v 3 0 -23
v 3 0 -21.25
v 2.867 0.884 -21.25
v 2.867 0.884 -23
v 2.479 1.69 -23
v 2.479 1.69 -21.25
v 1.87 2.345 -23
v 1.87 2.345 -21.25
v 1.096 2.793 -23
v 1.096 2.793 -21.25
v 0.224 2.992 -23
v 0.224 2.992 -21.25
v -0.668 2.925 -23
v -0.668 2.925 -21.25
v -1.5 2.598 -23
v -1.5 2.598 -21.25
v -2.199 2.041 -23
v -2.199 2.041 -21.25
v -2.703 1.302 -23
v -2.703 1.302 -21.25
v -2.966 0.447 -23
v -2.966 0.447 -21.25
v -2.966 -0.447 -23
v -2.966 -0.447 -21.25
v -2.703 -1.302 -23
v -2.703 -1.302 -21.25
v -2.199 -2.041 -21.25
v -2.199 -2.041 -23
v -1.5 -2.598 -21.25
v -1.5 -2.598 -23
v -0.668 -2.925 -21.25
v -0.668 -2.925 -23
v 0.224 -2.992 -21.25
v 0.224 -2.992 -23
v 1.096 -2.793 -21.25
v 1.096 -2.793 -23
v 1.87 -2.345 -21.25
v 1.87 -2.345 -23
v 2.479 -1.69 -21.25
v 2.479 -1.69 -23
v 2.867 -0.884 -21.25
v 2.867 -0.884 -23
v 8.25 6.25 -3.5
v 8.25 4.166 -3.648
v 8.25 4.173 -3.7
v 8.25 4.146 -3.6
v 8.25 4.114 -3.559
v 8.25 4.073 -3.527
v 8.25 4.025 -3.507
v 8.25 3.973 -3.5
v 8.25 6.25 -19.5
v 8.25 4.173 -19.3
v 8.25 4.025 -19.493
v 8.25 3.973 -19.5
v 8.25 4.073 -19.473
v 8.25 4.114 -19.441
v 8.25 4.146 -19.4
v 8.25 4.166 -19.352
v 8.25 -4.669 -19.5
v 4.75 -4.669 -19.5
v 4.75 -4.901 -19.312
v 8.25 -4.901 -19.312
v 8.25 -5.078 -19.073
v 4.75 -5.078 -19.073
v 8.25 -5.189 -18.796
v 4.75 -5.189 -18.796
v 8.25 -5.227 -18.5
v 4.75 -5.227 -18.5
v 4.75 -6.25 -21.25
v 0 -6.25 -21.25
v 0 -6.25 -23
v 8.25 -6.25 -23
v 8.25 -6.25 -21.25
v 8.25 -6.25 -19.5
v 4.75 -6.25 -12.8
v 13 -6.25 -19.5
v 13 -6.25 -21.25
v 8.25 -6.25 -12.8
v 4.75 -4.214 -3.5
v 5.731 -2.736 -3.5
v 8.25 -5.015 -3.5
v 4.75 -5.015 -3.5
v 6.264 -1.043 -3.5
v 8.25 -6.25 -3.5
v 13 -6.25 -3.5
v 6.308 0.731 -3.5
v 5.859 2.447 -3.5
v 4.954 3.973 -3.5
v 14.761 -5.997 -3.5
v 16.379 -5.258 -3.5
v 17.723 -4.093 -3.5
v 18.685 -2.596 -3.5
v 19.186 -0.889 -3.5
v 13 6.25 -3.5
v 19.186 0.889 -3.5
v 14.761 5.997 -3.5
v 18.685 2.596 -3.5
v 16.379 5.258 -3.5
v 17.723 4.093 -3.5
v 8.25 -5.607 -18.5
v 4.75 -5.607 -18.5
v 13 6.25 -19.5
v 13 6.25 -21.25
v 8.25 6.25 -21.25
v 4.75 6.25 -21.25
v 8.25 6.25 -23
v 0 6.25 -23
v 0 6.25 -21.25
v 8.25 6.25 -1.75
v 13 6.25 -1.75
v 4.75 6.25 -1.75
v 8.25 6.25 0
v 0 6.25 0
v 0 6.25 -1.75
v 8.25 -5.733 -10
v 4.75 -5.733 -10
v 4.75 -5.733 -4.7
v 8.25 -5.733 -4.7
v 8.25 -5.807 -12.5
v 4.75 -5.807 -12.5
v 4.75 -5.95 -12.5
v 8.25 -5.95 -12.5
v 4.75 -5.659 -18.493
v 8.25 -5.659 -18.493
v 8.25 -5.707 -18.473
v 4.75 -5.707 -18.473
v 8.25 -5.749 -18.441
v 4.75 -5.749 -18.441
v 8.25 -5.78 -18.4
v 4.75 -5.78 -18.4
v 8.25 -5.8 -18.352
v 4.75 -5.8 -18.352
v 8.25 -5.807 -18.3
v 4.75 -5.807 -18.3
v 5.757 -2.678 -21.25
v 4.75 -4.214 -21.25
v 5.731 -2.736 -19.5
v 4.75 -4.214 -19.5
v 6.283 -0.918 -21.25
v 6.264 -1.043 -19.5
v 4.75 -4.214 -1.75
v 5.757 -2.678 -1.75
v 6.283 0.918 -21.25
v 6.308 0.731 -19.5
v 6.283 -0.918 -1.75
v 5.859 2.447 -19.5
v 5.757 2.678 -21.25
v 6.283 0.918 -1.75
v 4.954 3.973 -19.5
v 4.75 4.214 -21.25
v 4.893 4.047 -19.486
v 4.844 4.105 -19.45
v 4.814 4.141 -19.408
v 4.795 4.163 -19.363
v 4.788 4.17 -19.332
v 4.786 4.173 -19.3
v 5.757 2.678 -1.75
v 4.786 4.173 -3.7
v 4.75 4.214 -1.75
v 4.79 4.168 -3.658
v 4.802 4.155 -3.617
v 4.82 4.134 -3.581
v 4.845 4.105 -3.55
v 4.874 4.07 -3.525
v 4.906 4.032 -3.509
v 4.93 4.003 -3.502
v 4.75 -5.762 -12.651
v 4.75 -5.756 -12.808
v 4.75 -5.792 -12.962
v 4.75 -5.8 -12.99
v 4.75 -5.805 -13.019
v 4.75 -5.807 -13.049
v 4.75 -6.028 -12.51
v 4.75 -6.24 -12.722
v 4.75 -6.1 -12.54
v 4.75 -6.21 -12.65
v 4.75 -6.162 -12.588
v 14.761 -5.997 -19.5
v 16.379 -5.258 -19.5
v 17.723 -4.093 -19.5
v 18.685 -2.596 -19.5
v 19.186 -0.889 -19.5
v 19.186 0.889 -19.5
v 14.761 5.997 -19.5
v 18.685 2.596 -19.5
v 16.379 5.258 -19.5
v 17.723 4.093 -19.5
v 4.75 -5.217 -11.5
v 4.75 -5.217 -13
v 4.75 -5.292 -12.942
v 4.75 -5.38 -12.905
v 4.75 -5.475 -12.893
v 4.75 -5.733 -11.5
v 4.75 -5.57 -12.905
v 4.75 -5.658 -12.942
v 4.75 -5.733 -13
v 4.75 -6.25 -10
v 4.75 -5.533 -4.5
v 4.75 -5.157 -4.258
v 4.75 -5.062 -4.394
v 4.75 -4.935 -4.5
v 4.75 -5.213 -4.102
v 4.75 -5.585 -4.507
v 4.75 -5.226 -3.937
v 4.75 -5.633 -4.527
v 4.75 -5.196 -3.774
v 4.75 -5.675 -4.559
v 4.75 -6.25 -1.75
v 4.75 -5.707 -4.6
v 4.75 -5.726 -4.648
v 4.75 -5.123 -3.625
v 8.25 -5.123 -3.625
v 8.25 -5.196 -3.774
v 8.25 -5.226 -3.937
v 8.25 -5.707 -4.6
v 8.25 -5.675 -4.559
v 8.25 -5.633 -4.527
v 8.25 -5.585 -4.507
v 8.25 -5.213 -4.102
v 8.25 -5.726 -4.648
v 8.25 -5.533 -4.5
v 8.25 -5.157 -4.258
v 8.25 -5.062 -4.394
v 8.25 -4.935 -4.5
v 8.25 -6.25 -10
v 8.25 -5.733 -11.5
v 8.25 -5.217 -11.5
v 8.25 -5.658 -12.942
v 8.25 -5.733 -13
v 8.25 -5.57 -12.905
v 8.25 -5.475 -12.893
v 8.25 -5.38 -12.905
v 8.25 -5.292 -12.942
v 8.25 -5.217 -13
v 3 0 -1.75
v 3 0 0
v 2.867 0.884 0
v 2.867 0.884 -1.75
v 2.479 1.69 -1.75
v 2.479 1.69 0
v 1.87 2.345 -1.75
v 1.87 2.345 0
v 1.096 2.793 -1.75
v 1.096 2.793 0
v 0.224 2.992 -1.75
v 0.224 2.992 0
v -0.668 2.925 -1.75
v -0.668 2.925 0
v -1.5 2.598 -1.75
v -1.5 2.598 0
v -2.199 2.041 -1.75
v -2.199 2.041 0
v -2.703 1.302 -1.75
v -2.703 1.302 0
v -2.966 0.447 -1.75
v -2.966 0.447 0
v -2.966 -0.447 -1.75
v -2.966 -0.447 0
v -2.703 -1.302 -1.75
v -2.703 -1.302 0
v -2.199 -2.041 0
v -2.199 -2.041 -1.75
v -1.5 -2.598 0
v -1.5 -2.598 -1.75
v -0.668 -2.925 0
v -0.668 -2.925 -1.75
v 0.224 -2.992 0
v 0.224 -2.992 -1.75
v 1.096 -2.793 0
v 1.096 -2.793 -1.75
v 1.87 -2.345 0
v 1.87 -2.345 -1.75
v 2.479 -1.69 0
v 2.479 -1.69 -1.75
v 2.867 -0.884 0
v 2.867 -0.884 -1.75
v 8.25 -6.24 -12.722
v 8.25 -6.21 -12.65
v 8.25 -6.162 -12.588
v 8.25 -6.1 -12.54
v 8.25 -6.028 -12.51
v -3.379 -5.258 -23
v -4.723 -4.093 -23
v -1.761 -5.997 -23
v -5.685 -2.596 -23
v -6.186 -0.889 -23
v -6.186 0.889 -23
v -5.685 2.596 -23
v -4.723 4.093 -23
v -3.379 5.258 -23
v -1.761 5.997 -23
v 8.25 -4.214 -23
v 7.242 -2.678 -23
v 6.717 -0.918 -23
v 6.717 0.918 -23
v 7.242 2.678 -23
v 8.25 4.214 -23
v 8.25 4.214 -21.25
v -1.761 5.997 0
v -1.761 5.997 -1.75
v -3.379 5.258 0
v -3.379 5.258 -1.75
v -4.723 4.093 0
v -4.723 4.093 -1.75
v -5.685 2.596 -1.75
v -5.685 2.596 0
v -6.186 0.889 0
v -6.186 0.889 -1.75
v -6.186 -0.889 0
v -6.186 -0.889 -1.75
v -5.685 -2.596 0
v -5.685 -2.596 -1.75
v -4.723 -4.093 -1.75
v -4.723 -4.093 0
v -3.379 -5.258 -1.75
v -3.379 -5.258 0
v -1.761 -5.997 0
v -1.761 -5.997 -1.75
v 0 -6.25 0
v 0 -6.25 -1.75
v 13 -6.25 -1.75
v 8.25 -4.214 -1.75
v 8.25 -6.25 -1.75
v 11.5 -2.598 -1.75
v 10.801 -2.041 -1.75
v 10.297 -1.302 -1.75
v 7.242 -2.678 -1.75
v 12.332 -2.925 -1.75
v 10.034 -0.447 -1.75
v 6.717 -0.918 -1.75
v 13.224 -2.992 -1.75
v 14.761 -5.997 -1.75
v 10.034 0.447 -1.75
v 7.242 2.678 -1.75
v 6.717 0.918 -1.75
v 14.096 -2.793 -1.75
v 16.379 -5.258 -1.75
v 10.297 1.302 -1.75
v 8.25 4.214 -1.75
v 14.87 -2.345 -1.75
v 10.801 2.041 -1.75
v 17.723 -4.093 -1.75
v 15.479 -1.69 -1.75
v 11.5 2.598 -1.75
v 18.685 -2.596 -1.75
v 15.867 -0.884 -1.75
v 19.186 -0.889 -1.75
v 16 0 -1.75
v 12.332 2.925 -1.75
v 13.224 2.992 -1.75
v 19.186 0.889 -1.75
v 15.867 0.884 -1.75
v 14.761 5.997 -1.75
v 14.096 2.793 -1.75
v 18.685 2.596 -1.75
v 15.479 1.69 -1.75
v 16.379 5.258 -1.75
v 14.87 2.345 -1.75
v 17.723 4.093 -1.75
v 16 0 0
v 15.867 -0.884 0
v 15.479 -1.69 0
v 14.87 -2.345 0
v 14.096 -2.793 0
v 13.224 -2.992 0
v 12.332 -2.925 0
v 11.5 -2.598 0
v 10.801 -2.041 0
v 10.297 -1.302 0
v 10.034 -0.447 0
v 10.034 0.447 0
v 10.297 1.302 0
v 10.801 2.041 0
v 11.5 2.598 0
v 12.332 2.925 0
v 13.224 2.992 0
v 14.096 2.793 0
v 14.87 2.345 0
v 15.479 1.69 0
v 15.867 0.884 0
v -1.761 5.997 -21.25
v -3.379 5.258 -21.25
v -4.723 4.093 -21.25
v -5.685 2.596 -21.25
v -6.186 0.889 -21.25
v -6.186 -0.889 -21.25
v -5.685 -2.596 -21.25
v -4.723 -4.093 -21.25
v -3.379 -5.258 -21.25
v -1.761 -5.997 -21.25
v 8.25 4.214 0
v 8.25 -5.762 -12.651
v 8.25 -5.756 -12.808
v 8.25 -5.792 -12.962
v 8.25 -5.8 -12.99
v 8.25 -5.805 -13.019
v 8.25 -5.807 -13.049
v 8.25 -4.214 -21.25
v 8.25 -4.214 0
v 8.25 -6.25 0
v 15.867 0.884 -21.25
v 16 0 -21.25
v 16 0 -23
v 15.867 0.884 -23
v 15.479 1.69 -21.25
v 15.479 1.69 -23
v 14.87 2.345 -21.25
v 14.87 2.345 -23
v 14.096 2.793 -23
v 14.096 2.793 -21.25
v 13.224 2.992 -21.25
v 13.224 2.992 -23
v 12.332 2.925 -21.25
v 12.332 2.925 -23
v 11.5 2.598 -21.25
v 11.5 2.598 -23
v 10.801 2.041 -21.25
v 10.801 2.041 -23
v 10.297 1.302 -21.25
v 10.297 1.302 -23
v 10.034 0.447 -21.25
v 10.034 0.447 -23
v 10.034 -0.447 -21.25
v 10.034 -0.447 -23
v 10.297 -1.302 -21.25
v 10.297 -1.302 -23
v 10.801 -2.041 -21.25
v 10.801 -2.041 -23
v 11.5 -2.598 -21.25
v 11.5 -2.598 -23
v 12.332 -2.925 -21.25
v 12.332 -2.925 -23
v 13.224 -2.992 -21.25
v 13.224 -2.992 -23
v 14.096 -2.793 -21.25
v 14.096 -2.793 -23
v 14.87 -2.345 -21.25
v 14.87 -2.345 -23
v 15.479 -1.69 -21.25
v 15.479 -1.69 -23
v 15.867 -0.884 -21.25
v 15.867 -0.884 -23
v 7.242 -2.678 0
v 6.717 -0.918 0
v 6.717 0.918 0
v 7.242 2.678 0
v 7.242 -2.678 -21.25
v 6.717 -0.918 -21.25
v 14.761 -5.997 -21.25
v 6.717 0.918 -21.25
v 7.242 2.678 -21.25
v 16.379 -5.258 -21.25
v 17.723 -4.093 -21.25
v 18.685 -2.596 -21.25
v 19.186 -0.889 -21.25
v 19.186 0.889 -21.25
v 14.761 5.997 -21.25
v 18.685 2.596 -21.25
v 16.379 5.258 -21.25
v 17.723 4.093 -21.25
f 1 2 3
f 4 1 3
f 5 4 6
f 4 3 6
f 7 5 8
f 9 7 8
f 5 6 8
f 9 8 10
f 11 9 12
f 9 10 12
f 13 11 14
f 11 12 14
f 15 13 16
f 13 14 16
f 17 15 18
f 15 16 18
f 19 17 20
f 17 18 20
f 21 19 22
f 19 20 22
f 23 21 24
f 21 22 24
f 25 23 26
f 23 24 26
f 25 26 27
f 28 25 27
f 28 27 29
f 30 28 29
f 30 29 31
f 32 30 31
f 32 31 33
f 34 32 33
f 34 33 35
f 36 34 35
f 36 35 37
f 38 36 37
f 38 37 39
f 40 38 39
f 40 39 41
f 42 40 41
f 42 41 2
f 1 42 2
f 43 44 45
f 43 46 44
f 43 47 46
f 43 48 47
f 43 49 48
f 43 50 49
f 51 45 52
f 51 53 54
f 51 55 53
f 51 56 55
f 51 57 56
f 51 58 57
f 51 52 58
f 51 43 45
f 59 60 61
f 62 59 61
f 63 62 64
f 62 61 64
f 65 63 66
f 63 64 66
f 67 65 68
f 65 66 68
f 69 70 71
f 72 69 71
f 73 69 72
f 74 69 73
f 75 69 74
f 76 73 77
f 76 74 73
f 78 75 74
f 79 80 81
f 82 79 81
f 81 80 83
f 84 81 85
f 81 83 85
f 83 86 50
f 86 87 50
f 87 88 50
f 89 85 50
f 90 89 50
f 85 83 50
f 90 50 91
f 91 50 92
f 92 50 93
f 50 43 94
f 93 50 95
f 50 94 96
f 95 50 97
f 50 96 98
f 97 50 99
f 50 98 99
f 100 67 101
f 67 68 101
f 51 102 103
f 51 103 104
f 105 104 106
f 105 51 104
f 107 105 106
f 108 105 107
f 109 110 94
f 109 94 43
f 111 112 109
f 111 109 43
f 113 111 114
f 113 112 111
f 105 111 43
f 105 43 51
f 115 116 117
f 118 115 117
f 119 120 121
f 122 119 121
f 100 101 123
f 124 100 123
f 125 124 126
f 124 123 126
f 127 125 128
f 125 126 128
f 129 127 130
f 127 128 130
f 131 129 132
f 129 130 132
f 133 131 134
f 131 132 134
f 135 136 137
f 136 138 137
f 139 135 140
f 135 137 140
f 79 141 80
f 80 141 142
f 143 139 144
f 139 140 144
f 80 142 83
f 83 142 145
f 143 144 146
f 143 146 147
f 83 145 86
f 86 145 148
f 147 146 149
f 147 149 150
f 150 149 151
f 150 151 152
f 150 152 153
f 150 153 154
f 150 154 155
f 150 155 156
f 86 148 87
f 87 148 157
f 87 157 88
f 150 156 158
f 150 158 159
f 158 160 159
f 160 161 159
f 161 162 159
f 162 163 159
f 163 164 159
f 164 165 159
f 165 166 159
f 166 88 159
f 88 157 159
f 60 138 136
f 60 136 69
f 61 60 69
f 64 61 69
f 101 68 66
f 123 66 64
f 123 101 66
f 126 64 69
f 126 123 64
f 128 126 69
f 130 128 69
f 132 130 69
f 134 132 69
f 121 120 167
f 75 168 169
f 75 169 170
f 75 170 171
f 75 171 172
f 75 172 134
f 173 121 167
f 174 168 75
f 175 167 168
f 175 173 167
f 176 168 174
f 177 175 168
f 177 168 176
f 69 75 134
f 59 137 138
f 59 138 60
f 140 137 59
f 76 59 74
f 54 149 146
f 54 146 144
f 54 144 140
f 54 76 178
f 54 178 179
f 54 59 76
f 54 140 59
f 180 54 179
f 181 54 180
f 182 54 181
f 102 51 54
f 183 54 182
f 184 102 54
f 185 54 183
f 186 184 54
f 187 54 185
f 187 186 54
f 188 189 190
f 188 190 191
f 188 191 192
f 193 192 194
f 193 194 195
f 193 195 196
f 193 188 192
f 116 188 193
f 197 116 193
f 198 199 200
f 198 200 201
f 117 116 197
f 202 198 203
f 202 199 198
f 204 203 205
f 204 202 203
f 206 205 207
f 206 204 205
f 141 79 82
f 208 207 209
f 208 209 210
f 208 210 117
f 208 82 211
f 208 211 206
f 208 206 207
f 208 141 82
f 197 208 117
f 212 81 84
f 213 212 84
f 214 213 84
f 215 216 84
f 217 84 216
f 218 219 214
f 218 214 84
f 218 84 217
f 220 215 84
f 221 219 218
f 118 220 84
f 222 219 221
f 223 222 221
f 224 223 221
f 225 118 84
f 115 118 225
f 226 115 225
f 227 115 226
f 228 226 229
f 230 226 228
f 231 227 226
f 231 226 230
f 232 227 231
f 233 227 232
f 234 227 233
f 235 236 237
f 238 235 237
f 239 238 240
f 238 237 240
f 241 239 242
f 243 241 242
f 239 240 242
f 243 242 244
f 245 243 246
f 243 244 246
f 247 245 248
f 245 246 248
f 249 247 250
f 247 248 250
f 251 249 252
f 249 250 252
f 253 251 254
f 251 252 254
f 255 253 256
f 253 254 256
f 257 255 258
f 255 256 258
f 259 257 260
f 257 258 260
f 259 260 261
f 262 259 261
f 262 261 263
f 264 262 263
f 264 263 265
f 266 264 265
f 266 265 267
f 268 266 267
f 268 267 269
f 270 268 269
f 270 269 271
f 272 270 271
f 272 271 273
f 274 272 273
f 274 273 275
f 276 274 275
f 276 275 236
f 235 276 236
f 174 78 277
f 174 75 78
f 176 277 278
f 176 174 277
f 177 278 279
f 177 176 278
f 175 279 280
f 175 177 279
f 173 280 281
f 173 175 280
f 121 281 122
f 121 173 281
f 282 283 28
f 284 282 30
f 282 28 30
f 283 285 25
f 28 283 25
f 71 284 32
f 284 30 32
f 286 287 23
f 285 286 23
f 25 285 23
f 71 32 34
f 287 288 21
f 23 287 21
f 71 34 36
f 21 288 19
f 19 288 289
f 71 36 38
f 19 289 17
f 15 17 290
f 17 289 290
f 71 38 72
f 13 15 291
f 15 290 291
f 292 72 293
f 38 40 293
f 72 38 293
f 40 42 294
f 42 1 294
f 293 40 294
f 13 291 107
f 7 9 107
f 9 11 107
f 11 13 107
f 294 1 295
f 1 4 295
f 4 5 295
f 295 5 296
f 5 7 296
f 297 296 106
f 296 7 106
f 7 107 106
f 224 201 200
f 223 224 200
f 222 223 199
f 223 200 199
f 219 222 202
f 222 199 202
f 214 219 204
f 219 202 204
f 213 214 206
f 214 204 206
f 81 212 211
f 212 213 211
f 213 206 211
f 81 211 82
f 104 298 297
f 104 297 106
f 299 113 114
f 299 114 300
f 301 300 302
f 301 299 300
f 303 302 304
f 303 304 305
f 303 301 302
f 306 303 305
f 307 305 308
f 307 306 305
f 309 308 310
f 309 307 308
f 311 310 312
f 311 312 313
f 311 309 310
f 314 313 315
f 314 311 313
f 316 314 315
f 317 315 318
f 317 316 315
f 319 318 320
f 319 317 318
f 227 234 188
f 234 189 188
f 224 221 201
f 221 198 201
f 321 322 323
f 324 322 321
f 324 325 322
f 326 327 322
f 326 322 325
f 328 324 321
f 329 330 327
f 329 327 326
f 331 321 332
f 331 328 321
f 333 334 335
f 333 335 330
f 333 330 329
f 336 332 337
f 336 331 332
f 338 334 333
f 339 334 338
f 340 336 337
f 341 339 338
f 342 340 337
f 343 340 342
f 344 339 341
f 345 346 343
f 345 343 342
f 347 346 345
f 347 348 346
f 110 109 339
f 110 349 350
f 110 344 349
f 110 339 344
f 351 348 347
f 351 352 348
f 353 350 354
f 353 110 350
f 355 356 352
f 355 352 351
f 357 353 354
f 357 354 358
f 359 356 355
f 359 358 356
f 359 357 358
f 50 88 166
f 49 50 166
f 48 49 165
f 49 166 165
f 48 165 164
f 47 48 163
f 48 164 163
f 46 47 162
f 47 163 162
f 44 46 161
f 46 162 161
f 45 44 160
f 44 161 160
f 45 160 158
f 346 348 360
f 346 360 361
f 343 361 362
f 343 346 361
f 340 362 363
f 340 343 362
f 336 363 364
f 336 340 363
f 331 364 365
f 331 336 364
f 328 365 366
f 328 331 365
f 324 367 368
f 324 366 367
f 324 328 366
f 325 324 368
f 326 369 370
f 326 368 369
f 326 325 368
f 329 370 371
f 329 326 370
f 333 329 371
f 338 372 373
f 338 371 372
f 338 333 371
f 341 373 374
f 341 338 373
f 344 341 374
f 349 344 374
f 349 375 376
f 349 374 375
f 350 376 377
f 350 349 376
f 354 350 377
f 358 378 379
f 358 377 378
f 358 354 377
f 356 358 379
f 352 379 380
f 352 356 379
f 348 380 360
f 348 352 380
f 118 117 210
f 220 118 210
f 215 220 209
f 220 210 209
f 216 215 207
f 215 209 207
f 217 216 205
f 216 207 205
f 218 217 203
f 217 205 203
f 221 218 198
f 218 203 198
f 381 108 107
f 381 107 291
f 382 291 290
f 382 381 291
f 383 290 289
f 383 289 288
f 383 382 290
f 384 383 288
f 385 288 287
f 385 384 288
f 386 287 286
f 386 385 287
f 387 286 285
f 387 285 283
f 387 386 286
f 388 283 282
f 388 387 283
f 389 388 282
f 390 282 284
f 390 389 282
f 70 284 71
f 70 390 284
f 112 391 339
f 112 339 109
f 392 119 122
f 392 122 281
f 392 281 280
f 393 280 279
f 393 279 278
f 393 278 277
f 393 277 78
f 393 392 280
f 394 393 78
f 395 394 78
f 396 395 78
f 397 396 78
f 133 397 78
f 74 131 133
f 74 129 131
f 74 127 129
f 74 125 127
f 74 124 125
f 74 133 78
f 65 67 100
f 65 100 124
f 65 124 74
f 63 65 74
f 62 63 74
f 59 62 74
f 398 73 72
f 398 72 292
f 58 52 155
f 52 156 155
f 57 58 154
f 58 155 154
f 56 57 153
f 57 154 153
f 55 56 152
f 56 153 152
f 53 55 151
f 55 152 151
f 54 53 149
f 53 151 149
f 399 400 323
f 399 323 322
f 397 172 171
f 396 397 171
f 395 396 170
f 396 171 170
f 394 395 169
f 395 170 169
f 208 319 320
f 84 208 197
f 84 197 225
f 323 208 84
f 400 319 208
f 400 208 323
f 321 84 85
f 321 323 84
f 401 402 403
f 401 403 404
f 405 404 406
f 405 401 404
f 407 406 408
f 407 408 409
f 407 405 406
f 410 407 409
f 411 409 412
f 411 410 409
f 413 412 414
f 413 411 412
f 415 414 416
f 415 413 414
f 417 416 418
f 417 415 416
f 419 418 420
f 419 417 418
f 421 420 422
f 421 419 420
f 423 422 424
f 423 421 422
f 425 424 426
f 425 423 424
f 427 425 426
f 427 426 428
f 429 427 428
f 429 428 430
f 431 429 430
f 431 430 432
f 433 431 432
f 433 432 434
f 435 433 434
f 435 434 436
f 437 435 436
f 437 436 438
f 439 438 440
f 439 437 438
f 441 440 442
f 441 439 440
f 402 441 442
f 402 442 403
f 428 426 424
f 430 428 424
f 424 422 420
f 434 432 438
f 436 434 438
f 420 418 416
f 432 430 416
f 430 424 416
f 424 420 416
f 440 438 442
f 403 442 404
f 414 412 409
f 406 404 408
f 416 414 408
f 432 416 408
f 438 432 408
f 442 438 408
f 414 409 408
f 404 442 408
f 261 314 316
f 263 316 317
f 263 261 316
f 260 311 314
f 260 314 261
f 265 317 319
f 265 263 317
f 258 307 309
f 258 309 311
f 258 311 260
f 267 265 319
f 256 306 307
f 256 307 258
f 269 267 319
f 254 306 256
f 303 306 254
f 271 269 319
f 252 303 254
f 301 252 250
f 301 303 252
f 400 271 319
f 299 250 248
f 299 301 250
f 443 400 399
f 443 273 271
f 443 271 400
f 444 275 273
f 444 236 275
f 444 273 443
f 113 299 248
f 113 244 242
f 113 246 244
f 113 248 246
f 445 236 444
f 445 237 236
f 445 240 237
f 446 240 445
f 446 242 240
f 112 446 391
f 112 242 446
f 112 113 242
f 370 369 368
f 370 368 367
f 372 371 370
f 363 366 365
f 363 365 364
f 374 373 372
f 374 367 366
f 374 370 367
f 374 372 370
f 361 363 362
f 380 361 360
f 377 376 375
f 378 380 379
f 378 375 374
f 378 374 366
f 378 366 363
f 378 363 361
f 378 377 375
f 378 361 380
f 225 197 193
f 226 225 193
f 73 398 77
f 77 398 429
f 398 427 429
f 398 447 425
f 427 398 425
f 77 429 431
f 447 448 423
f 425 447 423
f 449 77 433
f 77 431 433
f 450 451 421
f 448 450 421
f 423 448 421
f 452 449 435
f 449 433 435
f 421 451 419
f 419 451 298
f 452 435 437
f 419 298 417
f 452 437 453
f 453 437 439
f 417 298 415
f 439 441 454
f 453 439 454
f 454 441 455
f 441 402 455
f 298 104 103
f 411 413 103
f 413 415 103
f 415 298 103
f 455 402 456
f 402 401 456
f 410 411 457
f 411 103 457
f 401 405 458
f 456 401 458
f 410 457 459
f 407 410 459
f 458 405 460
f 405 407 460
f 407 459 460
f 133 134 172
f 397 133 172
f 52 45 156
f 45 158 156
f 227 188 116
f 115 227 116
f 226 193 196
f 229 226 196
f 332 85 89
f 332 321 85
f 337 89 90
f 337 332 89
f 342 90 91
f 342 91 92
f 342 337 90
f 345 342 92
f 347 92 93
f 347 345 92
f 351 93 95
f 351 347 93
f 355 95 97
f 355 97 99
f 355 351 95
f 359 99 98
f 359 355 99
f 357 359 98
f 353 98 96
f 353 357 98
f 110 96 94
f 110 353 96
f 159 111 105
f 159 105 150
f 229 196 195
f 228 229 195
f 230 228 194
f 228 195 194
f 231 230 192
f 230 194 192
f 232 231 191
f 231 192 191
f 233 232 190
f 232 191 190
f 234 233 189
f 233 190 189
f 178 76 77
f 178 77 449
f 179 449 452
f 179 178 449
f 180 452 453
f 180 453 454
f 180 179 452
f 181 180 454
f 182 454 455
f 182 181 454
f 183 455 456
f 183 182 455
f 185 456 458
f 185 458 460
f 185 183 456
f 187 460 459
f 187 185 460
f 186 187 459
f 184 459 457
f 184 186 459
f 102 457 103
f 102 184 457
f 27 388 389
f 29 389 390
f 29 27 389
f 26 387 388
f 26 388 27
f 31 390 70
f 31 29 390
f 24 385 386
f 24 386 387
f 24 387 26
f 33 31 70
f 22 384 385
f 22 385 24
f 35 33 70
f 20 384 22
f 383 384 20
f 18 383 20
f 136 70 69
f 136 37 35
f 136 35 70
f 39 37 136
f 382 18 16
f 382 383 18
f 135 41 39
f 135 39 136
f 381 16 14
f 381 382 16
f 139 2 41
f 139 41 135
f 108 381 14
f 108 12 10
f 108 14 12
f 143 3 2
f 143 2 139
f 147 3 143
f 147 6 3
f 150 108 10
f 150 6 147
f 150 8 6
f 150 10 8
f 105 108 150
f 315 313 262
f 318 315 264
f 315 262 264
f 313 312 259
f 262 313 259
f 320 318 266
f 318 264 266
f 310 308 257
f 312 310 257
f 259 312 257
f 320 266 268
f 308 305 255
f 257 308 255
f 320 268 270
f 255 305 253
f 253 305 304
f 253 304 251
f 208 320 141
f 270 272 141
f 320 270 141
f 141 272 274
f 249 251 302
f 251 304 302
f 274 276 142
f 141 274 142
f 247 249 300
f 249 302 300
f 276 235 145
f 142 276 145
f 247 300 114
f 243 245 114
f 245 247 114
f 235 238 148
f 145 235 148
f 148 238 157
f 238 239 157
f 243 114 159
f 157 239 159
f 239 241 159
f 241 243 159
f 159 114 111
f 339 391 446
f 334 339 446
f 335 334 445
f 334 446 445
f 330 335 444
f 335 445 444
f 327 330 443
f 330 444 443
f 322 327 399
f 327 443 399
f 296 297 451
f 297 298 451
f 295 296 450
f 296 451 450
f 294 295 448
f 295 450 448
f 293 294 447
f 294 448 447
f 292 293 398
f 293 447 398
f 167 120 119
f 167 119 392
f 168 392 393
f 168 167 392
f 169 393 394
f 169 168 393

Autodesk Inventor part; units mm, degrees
sketch "Sketch_1" plane through (0, 0, 0) normal (0, 0, 1) x (1, 0, 0)
  arc A0 (0, 6.25) -> (0, -6.25) centre (0, 0) ccw
  line L0 (0, -6.25) -> (8.25, -6.25)
  line L1 (8.25, -6.25) -> (8.25, -4.2143)
  arc A1 (8.25, 4.2143) -> (8.25, -4.2143) centre (13, 0) ccw
  line L2 (8.25, 4.2143) -> (8.25, 6.25)
  line L3 (8.25, 6.25) -> (0, 6.25)
  circle A2 centre (0, 0) radius 3
extrude "Extrusion1" add sketch "Sketch_1" against normal blind 1.75
sketch "Sketch_3" plane through (0, 0, -1.75) normal (0, 0, 1) x (1, 0, 0)
  circle A0 centre (13, 0) radius 3
sketch "Sketch_6" plane through (0, 0, -21.25) normal (0, 0, 1) x (1, 0, 0)
  circle A0 centre (13, 0) radius 3
sketch "Sketch_7" plane through (0, 0, -21.25) normal (0, 0, 1) x (1, 0, 0)
  arc A0 (0, 6.25) -> (0, -6.25) centre (0, 0) ccw
  line L0 (0, -6.25) -> (8.25, -6.25)
  line L1 (8.25, -6.25) -> (8.25, -4.2143)
  arc A1 (8.25, 4.2143) -> (8.25, -4.2143) centre (13, 0) ccw
  line L2 (8.25, 4.2143) -> (8.25, 6.25)
  line L3 (8.25, 6.25) -> (0, 6.25)
  circle A2 centre (0, 0) radius 3
sketch "Sketch_4" plane through (0, 0, -19.5) normal (0, 0, 1) x (1, 0, 0)
  line L0 (4.75, 6.25) -> (4.75, -6.25)
  line L1 (4.75, -6.25) -> (13, -6.25)
  arc A0 (13, -6.25) -> (13, 6.25) centre (13, 0) ccw
  line L2 (13, 6.25) -> (4.75, 6.25)
sketch "Sketch_5" plane through (0, 0, -1.75) normal (0, 0, 1) x (1, 0, 0)
  line L0 (4.75, 6.25) -> (4.75, -6.25)
  line L1 (4.75, -6.25) -> (13, -6.25)
  arc A0 (13, -6.25) -> (13, 6.25) centre (13, 0) ccw
  line L2 (13, 6.25) -> (4.75, 6.25)
extrude "Extrusion2" add sketch "Sketch_5" against normal blind 1.75
extrude "Extrusion3" add sketch "Sketch_3" along normal blind 1.75
sketch "Sketch_9" plane through (6.5, 0, 0) normal (1, 0, 0) x (0, 0, -1)
  arc A0 (3.7, 4.173) -> (3.5, 3.973) centre (3.7, 3.973) ccw
  line L0 (3.7, 4.173) -> (19.3, 4.173)
  arc A1 (19.5, 3.973) -> (19.3, 4.173) centre (19.3, 3.973) ccw
  line L1 (19.5, 3.973) -> (19.5, 6.25)
  line L2 (19.5, 6.25) -> (3.5, 6.25)
  line L3 (3.5, 6.25) -> (3.5, 3.973)
extrude "Extrusion4" add sketch "Sketch_9" along normal mid plane 3.5
sketch "Sketch_11" plane through (6.5, 0, 0) normal (1, 0, 0) x (0, 0, -1)
  line L0 (3.5, -5.0148) -> (3.5, -6.25)
  line L1 (3.5, -6.25) -> (10, -6.25)
  line L2 (10, -6.25) -> (11.5, -5.7333)
  line L3 (11.5, -5.7333) -> (13, -5.7333)
  arc A0 (13, -5.2167) -> (13, -5.7333) centre (13.2583, -5.475) ccw
  line L4 (13, -5.2167) -> (11.5, -5.2167)
  line L5 (11.5, -5.2167) -> (10, -5.7333)
  line L6 (10, -5.7333) -> (4.7, -5.7333)
  arc A1 (4.5, -5.5333) -> (4.7, -5.7333) centre (4.7, -5.5333) ccw
  line L7 (4.5, -5.5333) -> (4.5, -4.9347)
  arc A2 (3.5, -5.0148) -> (4.5, -4.9347) centre (3.97, -4.6003) ccw
extrude "Extrusion5" add sketch "Sketch_11" along normal mid plane 3.5
sketch "Sketch_12" plane through (6.5, 0, 0) normal (1, 0, 0) x (0, 0, -1)
  line L0 (12.5, -5.8071) -> (12.5, -5.95)
  arc A0 (12.5, -5.95) -> (12.8, -6.25) centre (12.8, -5.95) ccw
  line L1 (12.8, -6.25) -> (19.5, -6.25)
  line L2 (19.5, -6.25) -> (19.5, -4.6689)
  arc A1 (18.5, -5.227) -> (19.5, -4.6689) centre (18.5, -4.052) ccw
  line L3 (18.5, -5.227) -> (18.5, -5.6071)
  arc A2 (18.3, -5.8071) -> (18.5, -5.6071) centre (18.3, -5.6071) ccw
  line L4 (18.3, -5.8071) -> (13.049, -5.8071)
  arc A3 (12.9618, -5.7915) -> (13.049, -5.8071) centre (13.049, -5.5571) ccw
  arc A4 (12.9618, -5.7915) -> (12.5, -5.8071) centre (12.75, -6.361) ccw
extrude "Extrusion6" add sketch "Sketch_4" against normal blind 1.75
extrude "Extrusion7" add sketch "Sketch_6" against normal blind 1.75
extrude "Extrusion8" add sketch "Sketch_7" against normal blind 1.75
extrude "Extrusion9" add sketch "Sketch_12" along normal mid plane 3.5
sketch "Sketch_19" plane through (0, 0, -1.75) normal (0, 0, 1) x (1, 0, 0)
  line L0 (-8.25, 6.35) -> (-8.25, -6.35)
  line L1 (-8.25, -6.35) -> (0, -6.35)
  arc A0 (0, -6.35) -> (0, 6.35) centre (0, 0) ccw
  line L2 (0, 6.35) -> (-8.25, 6.35)
extrude "Extrusion10" cut sketch "Sketch_19" against normal blind 9.75
sketch "Sketch_20" plane through (0, 0, -21.25) normal (0, 0, 1) x (1, 0, 0)
  line L0 (-8.25, 6.35) -> (-8.25, -6.35)
  line L1 (-8.25, -6.35) -> (0, -6.35)
  arc A0 (0, -6.35) -> (0, 6.35) centre (0, 0) ccw
  line L2 (0, 6.35) -> (-8.25, 6.35)
extrude "Extrusion11" cut sketch "Sketch_20" along normal blind 9.75
ref_plane "R1_XY" through (0, 0, 0) normal (0, 0, 1) x (1, 0, 0)
ref_plane "R1_YZ" through (0, 0, 0) normal (1, 0, 0) x (0, 1, 0)
ref_plane "R1_ZX" through (0, 0, 0) normal (0, 1, 0) x (0, 0, 1)
ref_plane "clip_to_dummy_XY" through (6.5, -18, -11.5) normal (0, 0, 1) x (1, 0, 0)
ref_plane "clip_to_dummy_YZ" through (6.5, -18, -11.5) normal (1, 0, 0) x (0, 1, 0)
ref_plane "clip_to_dummy_ZX" through (6.5, -18, -11.5) normal (0, 1, 0) x (0, 0, 1)
ref_plane "move_1_XY" through (13, 0, 0) normal (0, 0, 1) x (1, 0, 0)
ref_plane "move_1_YZ" through (13, 0, 0) normal (1, 0, 0) x (0, 1, 0)
ref_plane "move_1_ZX" through (13, 0, 0) normal (0, 1, 0) x (0, 0, 1)
ref_plane "move_2_XY" through (0, 0, 0) normal (0, 0, 1) x (1, 0, 0)
ref_plane "move_2_YZ" through (0, 0, 0) normal (1, 0, 0) x (0, 1, 0)
ref_plane "move_2_ZX" through (0, 0, 0) normal (0, 1, 0) x (0, 0, 1)
ref_plane "move_end_XY" through (13, 0, 0) normal (0, 0, 1) x (1, 0, 0)
ref_plane "move_end_YZ" through (13, 0, 0) normal (1, 0, 0) x (0, 1, 0)
ref_plane "move_end_ZX" through (13, 0, 0) normal (0, 1, 0) x (0, 0, 1)
properties part number "SZ045F-16-018-27c"
